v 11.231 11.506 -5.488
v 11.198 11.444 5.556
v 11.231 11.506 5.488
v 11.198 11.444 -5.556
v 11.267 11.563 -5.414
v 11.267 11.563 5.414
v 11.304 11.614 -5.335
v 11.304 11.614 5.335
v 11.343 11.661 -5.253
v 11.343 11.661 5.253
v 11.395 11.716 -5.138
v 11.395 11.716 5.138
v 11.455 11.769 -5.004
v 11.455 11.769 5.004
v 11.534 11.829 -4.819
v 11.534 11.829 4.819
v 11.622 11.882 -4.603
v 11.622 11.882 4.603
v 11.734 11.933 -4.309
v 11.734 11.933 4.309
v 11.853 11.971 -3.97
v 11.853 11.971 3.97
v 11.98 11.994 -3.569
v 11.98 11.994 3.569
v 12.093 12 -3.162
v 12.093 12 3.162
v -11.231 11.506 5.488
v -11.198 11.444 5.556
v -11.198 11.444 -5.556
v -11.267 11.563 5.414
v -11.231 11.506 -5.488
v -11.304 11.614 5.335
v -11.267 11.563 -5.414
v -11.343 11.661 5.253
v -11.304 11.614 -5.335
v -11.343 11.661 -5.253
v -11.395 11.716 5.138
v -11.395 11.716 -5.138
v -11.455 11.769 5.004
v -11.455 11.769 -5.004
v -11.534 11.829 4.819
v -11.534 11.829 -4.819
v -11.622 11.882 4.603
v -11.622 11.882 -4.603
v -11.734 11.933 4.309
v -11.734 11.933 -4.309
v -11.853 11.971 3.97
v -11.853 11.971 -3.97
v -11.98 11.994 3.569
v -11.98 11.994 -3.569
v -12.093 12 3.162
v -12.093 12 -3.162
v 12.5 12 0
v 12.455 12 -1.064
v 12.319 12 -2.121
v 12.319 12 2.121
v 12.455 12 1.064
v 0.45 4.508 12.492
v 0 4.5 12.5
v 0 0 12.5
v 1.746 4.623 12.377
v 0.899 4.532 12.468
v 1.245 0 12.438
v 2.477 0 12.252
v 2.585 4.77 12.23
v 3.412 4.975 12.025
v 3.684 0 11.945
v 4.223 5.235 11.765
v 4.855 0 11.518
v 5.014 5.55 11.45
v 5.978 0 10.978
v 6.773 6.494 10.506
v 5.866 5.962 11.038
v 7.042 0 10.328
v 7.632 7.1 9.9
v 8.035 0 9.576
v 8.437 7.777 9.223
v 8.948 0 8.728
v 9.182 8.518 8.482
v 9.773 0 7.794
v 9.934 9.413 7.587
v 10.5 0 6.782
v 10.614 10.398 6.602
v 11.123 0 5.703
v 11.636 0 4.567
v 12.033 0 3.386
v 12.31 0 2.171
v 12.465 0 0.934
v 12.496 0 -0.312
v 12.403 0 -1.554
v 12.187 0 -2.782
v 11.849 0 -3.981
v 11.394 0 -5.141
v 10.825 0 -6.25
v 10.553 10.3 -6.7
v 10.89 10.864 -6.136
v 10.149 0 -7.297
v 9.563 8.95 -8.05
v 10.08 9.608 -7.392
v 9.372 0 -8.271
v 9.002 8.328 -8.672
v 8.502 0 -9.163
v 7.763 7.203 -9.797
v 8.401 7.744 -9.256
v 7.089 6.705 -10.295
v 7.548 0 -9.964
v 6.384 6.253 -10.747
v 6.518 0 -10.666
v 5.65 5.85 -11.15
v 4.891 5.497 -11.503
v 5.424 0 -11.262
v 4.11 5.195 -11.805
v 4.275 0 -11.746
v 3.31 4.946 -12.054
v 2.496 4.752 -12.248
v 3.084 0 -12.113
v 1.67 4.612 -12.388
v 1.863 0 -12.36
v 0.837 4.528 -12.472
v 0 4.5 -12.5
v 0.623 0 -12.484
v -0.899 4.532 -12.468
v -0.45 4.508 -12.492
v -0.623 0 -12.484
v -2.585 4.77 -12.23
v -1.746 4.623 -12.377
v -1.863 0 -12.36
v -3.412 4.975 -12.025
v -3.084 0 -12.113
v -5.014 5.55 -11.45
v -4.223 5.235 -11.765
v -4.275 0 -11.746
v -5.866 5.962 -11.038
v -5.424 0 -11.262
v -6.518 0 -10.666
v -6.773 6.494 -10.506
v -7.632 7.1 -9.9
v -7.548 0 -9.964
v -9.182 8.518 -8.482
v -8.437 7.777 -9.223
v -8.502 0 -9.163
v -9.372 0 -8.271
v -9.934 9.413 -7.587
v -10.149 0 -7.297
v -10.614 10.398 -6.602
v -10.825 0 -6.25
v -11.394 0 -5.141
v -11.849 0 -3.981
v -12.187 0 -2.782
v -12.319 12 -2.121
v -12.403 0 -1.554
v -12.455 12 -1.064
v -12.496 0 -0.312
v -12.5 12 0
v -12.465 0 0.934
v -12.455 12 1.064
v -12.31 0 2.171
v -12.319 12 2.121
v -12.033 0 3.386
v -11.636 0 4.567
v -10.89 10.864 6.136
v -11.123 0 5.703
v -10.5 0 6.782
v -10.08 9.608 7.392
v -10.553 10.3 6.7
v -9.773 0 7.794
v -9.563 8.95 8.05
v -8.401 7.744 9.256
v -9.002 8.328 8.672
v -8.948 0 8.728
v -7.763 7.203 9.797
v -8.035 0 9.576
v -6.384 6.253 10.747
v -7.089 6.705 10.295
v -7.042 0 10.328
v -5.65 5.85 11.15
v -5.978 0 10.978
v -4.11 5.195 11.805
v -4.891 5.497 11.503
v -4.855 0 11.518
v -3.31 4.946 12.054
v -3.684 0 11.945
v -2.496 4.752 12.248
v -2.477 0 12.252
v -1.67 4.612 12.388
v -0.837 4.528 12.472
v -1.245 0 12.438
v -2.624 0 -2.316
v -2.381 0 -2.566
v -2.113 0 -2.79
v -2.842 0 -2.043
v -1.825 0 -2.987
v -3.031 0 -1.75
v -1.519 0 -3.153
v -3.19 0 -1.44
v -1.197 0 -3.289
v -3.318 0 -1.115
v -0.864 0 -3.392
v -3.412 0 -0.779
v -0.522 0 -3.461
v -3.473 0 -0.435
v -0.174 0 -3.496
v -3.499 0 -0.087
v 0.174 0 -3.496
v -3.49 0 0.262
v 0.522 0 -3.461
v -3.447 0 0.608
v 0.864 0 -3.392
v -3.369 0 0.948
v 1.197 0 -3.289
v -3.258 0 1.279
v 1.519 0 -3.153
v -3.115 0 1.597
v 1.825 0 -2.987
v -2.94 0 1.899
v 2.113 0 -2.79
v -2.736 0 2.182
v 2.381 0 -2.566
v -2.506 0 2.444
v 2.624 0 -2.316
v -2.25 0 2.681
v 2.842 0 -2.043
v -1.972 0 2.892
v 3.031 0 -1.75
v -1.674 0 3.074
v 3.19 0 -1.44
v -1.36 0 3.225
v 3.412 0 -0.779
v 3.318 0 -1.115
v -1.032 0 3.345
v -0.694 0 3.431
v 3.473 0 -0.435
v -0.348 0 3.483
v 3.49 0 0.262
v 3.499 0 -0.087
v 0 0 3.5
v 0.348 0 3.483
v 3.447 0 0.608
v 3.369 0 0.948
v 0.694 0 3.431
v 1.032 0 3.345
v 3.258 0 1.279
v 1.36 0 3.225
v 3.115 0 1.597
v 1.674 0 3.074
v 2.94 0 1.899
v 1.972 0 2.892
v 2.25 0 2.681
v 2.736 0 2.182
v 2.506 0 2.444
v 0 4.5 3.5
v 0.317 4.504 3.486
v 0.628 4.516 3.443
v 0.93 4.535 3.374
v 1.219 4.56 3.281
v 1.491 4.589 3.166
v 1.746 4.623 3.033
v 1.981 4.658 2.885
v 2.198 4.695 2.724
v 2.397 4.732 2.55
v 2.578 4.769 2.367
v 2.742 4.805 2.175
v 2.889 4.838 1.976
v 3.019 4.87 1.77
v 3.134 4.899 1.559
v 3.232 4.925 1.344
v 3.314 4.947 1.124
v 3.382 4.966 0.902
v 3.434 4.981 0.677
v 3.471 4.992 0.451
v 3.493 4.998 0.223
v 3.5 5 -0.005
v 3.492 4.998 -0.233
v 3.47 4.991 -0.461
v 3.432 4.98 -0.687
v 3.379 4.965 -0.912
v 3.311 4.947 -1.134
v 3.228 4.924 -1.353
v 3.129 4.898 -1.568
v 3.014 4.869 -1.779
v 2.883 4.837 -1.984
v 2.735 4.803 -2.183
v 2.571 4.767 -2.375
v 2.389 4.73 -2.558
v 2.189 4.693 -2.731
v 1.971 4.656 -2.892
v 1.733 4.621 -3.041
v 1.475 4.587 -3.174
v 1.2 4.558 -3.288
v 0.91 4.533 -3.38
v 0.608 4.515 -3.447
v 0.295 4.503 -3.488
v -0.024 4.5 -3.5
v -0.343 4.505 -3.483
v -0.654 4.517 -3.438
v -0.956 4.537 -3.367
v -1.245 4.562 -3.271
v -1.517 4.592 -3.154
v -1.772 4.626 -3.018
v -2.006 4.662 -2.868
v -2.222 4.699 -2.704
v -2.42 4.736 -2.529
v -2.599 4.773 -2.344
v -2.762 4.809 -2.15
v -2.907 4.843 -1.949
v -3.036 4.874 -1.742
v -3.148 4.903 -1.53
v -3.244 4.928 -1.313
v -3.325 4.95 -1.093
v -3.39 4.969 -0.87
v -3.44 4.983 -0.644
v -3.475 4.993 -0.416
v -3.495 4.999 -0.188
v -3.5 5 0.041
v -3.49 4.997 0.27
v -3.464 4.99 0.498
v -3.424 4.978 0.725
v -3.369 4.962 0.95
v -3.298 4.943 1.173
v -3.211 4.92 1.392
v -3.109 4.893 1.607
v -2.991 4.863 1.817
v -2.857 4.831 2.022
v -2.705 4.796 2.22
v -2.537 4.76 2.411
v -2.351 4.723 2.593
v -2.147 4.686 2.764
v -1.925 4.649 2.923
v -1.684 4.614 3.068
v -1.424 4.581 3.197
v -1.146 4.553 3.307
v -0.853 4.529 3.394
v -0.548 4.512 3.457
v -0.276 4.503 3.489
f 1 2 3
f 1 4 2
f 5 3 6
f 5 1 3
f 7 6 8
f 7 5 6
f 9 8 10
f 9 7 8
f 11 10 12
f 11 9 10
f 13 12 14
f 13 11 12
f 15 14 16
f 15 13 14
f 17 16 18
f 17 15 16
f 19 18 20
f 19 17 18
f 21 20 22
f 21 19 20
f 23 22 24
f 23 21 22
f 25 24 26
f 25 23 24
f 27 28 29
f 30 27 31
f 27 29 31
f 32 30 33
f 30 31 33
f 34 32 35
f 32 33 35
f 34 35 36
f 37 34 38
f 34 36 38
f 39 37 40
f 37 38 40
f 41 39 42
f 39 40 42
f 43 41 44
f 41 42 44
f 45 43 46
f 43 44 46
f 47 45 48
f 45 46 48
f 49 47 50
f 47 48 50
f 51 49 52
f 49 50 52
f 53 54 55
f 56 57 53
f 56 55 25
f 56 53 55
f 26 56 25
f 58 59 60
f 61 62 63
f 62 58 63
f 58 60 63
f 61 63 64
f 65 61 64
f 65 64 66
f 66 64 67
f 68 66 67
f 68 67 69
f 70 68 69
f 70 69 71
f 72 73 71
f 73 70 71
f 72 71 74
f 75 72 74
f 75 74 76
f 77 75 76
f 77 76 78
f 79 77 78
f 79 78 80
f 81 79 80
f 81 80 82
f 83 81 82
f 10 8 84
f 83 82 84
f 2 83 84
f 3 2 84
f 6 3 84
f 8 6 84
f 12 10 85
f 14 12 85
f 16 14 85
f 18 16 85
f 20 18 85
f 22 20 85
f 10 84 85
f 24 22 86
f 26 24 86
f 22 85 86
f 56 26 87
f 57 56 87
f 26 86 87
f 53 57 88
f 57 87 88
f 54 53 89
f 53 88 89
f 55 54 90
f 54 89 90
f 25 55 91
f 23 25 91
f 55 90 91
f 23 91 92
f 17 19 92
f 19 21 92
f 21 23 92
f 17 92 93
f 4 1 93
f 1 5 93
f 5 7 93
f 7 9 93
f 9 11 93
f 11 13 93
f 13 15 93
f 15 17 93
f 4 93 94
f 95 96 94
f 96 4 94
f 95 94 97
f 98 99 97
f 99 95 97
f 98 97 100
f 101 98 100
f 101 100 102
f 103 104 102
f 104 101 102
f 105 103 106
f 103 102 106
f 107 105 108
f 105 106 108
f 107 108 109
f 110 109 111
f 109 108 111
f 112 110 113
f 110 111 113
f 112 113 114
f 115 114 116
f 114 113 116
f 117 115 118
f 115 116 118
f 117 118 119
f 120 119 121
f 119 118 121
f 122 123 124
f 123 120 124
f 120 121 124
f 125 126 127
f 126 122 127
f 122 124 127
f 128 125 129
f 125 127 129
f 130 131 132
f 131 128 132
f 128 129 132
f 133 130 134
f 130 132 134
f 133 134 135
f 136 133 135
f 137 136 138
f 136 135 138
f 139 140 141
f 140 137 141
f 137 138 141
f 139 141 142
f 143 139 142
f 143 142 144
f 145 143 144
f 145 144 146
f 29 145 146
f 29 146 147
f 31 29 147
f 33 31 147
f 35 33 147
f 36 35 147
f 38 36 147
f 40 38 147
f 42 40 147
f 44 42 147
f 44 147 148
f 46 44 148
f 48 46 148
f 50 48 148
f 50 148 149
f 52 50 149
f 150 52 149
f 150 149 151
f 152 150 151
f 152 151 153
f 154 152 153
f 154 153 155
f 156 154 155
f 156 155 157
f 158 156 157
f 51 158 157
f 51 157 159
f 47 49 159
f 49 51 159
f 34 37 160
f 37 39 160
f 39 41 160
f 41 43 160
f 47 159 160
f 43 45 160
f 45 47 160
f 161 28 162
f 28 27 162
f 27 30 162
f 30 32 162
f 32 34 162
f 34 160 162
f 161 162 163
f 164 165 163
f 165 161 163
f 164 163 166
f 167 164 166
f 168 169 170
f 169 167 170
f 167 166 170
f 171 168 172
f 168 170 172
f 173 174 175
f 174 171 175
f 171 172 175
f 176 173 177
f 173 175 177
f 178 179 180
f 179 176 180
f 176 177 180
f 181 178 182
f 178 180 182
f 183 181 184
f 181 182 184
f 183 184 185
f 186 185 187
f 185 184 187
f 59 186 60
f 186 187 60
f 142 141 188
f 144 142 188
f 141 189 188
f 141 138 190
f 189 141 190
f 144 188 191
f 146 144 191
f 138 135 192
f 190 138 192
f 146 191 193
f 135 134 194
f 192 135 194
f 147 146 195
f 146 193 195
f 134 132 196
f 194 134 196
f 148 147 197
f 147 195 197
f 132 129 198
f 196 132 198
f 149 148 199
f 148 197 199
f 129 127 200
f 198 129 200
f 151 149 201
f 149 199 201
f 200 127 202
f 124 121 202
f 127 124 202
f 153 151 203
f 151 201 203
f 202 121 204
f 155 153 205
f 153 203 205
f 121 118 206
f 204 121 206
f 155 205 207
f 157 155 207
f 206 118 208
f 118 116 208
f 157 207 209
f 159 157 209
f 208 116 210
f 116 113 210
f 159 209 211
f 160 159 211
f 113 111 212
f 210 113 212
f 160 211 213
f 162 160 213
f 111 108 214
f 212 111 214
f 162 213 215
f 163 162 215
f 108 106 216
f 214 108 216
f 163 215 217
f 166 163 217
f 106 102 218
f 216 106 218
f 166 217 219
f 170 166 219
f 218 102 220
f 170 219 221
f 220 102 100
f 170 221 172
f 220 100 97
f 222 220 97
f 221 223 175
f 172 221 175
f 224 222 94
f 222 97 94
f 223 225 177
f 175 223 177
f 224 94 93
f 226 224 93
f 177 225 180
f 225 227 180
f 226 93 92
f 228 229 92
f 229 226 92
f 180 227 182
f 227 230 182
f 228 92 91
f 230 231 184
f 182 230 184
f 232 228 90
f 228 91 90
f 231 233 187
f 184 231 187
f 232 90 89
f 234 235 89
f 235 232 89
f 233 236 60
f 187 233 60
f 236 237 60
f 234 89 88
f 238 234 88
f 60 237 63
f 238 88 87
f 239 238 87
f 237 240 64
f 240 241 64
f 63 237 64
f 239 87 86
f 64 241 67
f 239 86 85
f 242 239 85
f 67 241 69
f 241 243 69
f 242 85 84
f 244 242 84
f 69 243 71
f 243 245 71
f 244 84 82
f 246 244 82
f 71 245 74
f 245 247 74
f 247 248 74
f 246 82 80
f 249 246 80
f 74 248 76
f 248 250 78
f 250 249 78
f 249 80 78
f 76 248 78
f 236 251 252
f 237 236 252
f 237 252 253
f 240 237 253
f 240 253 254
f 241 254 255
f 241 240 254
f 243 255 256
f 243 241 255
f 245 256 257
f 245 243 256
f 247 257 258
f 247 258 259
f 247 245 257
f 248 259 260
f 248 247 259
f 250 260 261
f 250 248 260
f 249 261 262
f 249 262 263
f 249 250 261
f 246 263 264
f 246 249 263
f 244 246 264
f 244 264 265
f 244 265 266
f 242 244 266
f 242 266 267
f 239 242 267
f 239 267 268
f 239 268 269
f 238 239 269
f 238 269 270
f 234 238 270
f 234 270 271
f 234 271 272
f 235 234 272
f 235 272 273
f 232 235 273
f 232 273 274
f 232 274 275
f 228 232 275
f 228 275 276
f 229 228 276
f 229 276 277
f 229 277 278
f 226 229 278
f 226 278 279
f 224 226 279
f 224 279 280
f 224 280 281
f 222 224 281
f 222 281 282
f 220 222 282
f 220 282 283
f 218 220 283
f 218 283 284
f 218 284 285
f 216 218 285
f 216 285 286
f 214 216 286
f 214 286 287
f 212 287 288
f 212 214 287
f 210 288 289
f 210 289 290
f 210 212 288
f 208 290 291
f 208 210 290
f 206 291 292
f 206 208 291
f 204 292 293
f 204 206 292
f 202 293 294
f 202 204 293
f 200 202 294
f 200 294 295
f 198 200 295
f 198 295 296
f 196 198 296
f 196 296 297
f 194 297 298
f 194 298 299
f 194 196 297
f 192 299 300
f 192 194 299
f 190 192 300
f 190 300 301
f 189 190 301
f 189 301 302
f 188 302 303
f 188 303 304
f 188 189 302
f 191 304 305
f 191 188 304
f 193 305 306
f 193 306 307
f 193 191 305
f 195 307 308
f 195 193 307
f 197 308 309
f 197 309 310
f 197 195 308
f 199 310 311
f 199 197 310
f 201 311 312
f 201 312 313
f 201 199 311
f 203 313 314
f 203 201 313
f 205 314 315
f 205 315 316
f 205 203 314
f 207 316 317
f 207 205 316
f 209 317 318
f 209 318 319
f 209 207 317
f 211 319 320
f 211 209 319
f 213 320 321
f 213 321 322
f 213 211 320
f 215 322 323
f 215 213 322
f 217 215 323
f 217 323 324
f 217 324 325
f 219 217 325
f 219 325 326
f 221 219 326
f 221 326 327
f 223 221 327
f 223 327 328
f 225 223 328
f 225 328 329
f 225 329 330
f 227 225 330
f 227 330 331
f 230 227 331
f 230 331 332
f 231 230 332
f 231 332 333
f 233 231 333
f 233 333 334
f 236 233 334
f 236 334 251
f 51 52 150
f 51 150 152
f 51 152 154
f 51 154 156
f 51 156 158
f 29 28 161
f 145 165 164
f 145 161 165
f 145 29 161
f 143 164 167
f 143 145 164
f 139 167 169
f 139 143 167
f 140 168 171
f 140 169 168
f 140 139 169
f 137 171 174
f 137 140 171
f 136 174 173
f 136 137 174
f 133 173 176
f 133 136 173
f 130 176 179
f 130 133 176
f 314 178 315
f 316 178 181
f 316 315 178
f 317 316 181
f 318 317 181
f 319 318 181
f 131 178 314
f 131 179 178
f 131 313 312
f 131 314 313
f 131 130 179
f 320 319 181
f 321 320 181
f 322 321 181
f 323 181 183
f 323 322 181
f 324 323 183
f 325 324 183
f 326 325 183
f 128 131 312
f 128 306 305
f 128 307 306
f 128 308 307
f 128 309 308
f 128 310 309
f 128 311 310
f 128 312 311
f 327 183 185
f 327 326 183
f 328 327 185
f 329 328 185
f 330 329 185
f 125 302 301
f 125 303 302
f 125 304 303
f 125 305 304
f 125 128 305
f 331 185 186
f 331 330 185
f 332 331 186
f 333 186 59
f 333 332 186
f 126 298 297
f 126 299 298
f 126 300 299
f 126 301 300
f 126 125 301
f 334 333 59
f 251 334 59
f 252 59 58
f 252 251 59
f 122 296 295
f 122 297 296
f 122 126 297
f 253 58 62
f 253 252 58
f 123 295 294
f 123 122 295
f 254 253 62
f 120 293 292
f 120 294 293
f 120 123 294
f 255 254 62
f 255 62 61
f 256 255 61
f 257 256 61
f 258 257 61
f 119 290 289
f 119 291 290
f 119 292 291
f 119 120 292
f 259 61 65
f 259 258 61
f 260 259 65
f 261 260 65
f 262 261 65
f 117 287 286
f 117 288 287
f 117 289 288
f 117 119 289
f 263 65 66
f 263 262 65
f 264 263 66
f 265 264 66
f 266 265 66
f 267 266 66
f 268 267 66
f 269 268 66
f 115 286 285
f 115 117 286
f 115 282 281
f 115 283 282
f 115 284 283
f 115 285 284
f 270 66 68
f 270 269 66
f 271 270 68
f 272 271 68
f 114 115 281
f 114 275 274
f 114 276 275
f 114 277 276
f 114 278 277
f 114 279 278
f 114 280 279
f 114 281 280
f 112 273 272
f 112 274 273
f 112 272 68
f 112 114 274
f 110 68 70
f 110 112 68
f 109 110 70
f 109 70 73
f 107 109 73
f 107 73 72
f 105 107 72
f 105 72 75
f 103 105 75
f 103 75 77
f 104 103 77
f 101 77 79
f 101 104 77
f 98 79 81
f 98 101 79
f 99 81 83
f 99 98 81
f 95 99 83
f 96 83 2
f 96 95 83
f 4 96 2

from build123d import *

# Parameters (mm, degrees)
SKETCH1_R               = 12.5
SKETCH1_R_2             = 3.5
BOSS_EXTRUDE1_DEPTH     = 12
CUT_EXTRUDE1_DEPTH      = 22
CUT_EXTRUDE1_DEPTH_BACK = 22
SKETCH2_R               = 12.5
FILLET2_R               = 1


with BuildPart() as part:
    # Sketch1 → Boss-Extrude1 (new body)
    with BuildSketch(Plane(origin=(0, 0, 0), x_dir=(1, 0, 0), z_dir=(0, 1, 0))):
        Circle(SKETCH1_R)
        Circle(SKETCH1_R_2, mode=Mode.SUBTRACT)
    extrude(amount=BOSS_EXTRUDE1_DEPTH)

    # Sketch2 → Cut-Extrude1 (cut, two sides: drawn at the far end of the back side and taken through both)
    with BuildSketch(Plane.XY.offset(-CUT_EXTRUDE1_DEPTH_BACK)):
        with Locations((0, 17)):
            Circle(SKETCH2_R)
    extrude(amount=CUT_EXTRUDE1_DEPTH + CUT_EXTRUDE1_DEPTH_BACK, mode=Mode.SUBTRACT)

    # Fillet2
    fillet2_edges = [part.edges().sort_by_distance(p)[0] for p in [
        (11.456439237, 12, 0),
        (-11.456439237, 12, 0),
    ]]
    fillet(fillet2_edges, radius=FILLET2_R)


solid = part.part
